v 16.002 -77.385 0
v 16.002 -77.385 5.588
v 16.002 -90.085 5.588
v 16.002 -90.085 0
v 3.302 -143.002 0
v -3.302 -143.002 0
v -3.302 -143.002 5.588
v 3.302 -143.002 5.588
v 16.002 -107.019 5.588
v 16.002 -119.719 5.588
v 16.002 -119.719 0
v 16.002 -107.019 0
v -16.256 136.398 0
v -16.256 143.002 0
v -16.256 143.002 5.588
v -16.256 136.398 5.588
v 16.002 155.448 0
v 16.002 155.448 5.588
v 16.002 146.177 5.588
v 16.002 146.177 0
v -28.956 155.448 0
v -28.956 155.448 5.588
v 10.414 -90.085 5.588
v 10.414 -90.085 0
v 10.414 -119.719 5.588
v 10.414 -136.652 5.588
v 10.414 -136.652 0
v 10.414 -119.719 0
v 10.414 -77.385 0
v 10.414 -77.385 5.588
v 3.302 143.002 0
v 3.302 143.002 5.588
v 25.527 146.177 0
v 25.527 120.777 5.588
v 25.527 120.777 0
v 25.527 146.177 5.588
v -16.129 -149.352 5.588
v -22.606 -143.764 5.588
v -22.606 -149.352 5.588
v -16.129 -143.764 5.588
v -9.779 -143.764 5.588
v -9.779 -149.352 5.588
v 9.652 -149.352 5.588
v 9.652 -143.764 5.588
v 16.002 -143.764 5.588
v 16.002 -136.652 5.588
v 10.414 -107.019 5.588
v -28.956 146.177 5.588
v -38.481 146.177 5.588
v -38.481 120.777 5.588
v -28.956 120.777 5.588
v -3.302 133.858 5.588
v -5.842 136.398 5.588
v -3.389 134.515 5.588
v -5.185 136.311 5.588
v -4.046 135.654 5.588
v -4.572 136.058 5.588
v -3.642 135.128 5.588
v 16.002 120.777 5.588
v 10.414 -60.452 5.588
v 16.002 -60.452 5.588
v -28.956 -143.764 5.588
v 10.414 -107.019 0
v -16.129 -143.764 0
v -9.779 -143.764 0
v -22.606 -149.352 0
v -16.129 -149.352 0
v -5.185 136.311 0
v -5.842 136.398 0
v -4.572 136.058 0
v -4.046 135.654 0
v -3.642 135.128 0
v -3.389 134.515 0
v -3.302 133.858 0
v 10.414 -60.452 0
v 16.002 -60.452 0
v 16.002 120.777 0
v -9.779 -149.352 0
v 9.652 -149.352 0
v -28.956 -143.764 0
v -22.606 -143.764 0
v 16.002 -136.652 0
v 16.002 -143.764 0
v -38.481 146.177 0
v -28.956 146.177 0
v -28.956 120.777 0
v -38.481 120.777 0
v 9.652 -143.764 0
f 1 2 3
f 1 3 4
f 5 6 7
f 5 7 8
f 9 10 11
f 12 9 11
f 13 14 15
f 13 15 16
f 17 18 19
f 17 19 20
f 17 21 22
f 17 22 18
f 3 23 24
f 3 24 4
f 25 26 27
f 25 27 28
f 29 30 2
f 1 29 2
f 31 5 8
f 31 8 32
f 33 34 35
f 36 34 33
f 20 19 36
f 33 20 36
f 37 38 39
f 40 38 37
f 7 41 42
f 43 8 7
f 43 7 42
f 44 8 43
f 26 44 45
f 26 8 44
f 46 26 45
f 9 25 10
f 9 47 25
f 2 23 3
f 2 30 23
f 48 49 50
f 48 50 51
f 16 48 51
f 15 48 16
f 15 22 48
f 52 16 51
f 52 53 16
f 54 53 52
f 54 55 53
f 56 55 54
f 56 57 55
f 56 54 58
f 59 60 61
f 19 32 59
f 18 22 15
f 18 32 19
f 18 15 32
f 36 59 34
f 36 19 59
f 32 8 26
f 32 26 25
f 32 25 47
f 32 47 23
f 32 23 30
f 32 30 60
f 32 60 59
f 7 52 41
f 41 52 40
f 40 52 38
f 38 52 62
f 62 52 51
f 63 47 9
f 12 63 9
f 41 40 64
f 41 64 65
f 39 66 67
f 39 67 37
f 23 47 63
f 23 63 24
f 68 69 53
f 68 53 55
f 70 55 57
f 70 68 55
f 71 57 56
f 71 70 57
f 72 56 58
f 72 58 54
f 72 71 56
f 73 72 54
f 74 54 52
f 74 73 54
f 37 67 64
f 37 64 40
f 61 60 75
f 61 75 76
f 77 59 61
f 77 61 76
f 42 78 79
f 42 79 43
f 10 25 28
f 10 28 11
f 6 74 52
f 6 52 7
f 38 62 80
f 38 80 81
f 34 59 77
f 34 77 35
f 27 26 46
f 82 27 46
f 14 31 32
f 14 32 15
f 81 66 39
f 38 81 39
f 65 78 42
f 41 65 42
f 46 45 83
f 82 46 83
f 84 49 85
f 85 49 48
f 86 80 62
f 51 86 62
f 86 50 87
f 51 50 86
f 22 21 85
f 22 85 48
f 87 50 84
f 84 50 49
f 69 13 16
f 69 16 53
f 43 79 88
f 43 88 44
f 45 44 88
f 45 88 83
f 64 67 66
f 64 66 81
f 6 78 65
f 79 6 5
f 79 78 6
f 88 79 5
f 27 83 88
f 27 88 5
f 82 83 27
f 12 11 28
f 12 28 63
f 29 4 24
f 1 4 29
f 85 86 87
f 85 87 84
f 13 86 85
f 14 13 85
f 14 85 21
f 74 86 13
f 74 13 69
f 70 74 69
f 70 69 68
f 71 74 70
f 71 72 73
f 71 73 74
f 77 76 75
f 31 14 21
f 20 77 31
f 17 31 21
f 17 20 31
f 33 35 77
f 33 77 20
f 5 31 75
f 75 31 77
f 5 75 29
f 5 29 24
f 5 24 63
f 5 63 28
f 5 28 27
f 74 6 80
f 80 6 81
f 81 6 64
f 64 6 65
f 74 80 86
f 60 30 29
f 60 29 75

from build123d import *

# Parameters (mm, degrees)
SKETCH1_W           = 44.958
SKETCH1_H           = 304.8
BOSS_EXTRUDE1_DEPTH = 5.588
SKETCH2_W           = 5.588
SKETCH2_H           = 101.6
BOSS_EXTRUDE2_DEPTH = 5.588
SKETCH3_W           = 222.25
SKETCH3_H           = 5.588
BOSS_EXTRUDE3_DEPTH = 39.37
SKETCH7_W           = 327.022738736
SKETCH7_H           = 279.435650021
CUT_EXTRUDE1_DEPTH  = 45.958
SKETCH4_W           = 6.35
SKETCH4_H           = 5.588
SKETCH4_H_2         = 12.7
CUT_EXTRUDE2_DEPTH  = 5.588
SKETCH6_W           = 5.588
SKETCH6_H           = 16.933333333
SKETCH6_H_2         = 16.933333334
CUT_EXTRUDE3_DEPTH  = 6.588
SKETCH8_W           = 9.525
SKETCH8_H           = 25.4
BOSS_EXTRUDE4_DEPTH = 5.588


with BuildPart() as part:
    # Sketch1 → Boss-Extrude1 (new body)
    with BuildSketch(Plane.XY):
        with Locations((-6.477, 3.048)):
            Rectangle(SKETCH1_W, SKETCH1_H)
        with BuildLine():
            Line((-3.302, 133.858), (-3.302, -143.002))
            Line((-3.302, -143.002), (3.302, -143.002))
            Line((3.302, -143.002), (3.302, 143.002))
            Line((3.302, 143.002), (-16.256, 143.002))
            Line((-16.256, 143.002), (-16.256, 136.398))
            Line((-16.256, 136.398), (-5.842, 136.398))
            ThreePointArc((-5.842, 136.398), (-4.045948776, 135.654051224), (-3.302, 133.858))
        make_face(mode=Mode.SUBTRACT)
    extrude(amount=BOSS_EXTRUDE1_DEPTH)

    # Sketch2 → Boss-Extrude2 (add)
    with BuildSketch(Plane(origin=(16.002, 0, 0), x_dir=(0, 0, -1), z_dir=(1, 0, 0))):
        Polygon((222.25, -60.452), (222.25, -47.752), (0, -47.752), (0, -149.352), (222.25, -149.352), (222.25, -136.652), (228.6, -136.652), (228.6, -119.718666667), (222.25, -119.718666667), (222.25, -107.018666667), (228.6, -107.018666667), (228.6, -90.085333333), (222.25, -90.085333333), (222.25, -77.385333333), (228.6, -77.385333333), (228.6, -60.452), align=None)
        with BuildLine():
            ThreePointArc((11.4, -116.592), (9.9, -118.092), (8.4, -116.592))
            Line((8.4, -116.592), (8.4, -111.512))
            ThreePointArc((8.4, -111.512), (9.9, -110.012), (11.4, -111.512))
            Line((11.4, -111.512), (11.4, -116.592))
        make_face(mode=Mode.SUBTRACT)
        with BuildLine():
            Line((42.4, -111.512), (42.4, -116.592))
            ThreePointArc((42.4, -116.592), (40.9, -118.092), (39.4, -116.592))
            Line((39.4, -116.592), (39.4, -111.512))
            ThreePointArc((39.4, -111.512), (40.9, -110.012), (42.4, -111.512))
        make_face(mode=Mode.SUBTRACT)
        with BuildLine():
            ThreePointArc((36.4, -101.092), (25.4, -112.092), (14.4, -101.092))
            Line((14.4, -101.092), (14.4, -96.012))
            ThreePointArc((14.4, -96.012), (25.4, -85.012), (36.4, -96.012))
            Line((36.4, -96.012), (36.4, -101.092))
        make_face(mode=Mode.SUBTRACT)
        with BuildLine():
            ThreePointArc((11.4, -85.592), (9.9, -87.092), (8.4, -85.592))
            Line((8.4, -85.592), (8.4, -80.512))
            ThreePointArc((8.4, -80.512), (9.9, -79.012), (11.4, -80.512))
            Line((11.4, -80.512), (11.4, -85.592))
        make_face(mode=Mode.SUBTRACT)
        with BuildLine():
            ThreePointArc((42.4, -85.592), (40.9, -87.092), (39.4, -85.592))
            Line((39.4, -85.592), (39.4, -80.512))
            ThreePointArc((39.4, -80.512), (40.9, -79.012), (42.4, -80.512))
            Line((42.4, -80.512), (42.4, -85.592))
        make_face(mode=Mode.SUBTRACT)
        with Locations((-2.794, -98.552)):
            Rectangle(SKETCH2_W, SKETCH2_H)
    extrude(amount=-BOSS_EXTRUDE2_DEPTH)

    # Sketch3 → Boss-Extrude3 (add)
    with BuildSketch(Plane.ZY.offset(-10.414)):
        with Locations((-111.125, -146.558)):
            Rectangle(SKETCH3_W, SKETCH3_H)
    extrude(amount=BOSS_EXTRUDE3_DEPTH)

    # Sketch7 → Cut-Extrude1 (cut, through all)
    with BuildSketch(Plane(origin=(16.002, 0, 0), x_dir=(0, 0, -1), z_dir=(1, 0, 0))):
        with Locations((163.511369368, -148.348068682)):
            Rectangle(SKETCH7_W, SKETCH7_H)
    extrude(amount=-CUT_EXTRUDE1_DEPTH, mode=Mode.SUBTRACT)

    # Sketch4 → Cut-Extrude2 (cut)
    with BuildSketch(Plane.XZ.offset(149.352)):
        with Locations((-12.954, 2.794)):
            Rectangle(SKETCH4_W, SKETCH4_H)
        with Locations((12.827, 2.794)):
            Rectangle(SKETCH4_W, SKETCH4_H)
        with Locations((-25.781, 2.794)):
            Rectangle(SKETCH4_W, SKETCH4_H)
        with Locations((12.827, -135.22325)):
            Rectangle(SKETCH4_W, SKETCH4_H_2)
        with Locations((12.827, -54.5465)):
            Rectangle(SKETCH4_W, SKETCH4_H_2)
        with Locations((12.827, -162.1155)):
            Rectangle(SKETCH4_W, SKETCH4_H_2)
    extrude(amount=-CUT_EXTRUDE2_DEPTH, mode=Mode.SUBTRACT)

    # Sketch6 → Cut-Extrude3 (cut, through all)
    with BuildSketch(Plane.XY.offset(5.588)):
        with Locations((13.208, -68.918666667)):
            Rectangle(SKETCH6_W, SKETCH6_H)
        with Locations((13.208, -98.552)):
            Rectangle(SKETCH6_W, SKETCH6_H_2)
        with Locations((13.208, -128.185333334)):
            Rectangle(SKETCH6_W, SKETCH6_H)
    extrude(amount=-CUT_EXTRUDE3_DEPTH, mode=Mode.SUBTRACT)

    # Sketch8 → Boss-Extrude4 (add)
    with BuildSketch(Plane.XY.offset(5.588)):
        with Locations((-33.7185, 133.477)):
            Rectangle(SKETCH8_W, SKETCH8_H)
        with Locations((20.7645, 133.477)):
            Rectangle(SKETCH8_W, SKETCH8_H)
    extrude(amount=-BOSS_EXTRUDE4_DEPTH)


solid = part.part
